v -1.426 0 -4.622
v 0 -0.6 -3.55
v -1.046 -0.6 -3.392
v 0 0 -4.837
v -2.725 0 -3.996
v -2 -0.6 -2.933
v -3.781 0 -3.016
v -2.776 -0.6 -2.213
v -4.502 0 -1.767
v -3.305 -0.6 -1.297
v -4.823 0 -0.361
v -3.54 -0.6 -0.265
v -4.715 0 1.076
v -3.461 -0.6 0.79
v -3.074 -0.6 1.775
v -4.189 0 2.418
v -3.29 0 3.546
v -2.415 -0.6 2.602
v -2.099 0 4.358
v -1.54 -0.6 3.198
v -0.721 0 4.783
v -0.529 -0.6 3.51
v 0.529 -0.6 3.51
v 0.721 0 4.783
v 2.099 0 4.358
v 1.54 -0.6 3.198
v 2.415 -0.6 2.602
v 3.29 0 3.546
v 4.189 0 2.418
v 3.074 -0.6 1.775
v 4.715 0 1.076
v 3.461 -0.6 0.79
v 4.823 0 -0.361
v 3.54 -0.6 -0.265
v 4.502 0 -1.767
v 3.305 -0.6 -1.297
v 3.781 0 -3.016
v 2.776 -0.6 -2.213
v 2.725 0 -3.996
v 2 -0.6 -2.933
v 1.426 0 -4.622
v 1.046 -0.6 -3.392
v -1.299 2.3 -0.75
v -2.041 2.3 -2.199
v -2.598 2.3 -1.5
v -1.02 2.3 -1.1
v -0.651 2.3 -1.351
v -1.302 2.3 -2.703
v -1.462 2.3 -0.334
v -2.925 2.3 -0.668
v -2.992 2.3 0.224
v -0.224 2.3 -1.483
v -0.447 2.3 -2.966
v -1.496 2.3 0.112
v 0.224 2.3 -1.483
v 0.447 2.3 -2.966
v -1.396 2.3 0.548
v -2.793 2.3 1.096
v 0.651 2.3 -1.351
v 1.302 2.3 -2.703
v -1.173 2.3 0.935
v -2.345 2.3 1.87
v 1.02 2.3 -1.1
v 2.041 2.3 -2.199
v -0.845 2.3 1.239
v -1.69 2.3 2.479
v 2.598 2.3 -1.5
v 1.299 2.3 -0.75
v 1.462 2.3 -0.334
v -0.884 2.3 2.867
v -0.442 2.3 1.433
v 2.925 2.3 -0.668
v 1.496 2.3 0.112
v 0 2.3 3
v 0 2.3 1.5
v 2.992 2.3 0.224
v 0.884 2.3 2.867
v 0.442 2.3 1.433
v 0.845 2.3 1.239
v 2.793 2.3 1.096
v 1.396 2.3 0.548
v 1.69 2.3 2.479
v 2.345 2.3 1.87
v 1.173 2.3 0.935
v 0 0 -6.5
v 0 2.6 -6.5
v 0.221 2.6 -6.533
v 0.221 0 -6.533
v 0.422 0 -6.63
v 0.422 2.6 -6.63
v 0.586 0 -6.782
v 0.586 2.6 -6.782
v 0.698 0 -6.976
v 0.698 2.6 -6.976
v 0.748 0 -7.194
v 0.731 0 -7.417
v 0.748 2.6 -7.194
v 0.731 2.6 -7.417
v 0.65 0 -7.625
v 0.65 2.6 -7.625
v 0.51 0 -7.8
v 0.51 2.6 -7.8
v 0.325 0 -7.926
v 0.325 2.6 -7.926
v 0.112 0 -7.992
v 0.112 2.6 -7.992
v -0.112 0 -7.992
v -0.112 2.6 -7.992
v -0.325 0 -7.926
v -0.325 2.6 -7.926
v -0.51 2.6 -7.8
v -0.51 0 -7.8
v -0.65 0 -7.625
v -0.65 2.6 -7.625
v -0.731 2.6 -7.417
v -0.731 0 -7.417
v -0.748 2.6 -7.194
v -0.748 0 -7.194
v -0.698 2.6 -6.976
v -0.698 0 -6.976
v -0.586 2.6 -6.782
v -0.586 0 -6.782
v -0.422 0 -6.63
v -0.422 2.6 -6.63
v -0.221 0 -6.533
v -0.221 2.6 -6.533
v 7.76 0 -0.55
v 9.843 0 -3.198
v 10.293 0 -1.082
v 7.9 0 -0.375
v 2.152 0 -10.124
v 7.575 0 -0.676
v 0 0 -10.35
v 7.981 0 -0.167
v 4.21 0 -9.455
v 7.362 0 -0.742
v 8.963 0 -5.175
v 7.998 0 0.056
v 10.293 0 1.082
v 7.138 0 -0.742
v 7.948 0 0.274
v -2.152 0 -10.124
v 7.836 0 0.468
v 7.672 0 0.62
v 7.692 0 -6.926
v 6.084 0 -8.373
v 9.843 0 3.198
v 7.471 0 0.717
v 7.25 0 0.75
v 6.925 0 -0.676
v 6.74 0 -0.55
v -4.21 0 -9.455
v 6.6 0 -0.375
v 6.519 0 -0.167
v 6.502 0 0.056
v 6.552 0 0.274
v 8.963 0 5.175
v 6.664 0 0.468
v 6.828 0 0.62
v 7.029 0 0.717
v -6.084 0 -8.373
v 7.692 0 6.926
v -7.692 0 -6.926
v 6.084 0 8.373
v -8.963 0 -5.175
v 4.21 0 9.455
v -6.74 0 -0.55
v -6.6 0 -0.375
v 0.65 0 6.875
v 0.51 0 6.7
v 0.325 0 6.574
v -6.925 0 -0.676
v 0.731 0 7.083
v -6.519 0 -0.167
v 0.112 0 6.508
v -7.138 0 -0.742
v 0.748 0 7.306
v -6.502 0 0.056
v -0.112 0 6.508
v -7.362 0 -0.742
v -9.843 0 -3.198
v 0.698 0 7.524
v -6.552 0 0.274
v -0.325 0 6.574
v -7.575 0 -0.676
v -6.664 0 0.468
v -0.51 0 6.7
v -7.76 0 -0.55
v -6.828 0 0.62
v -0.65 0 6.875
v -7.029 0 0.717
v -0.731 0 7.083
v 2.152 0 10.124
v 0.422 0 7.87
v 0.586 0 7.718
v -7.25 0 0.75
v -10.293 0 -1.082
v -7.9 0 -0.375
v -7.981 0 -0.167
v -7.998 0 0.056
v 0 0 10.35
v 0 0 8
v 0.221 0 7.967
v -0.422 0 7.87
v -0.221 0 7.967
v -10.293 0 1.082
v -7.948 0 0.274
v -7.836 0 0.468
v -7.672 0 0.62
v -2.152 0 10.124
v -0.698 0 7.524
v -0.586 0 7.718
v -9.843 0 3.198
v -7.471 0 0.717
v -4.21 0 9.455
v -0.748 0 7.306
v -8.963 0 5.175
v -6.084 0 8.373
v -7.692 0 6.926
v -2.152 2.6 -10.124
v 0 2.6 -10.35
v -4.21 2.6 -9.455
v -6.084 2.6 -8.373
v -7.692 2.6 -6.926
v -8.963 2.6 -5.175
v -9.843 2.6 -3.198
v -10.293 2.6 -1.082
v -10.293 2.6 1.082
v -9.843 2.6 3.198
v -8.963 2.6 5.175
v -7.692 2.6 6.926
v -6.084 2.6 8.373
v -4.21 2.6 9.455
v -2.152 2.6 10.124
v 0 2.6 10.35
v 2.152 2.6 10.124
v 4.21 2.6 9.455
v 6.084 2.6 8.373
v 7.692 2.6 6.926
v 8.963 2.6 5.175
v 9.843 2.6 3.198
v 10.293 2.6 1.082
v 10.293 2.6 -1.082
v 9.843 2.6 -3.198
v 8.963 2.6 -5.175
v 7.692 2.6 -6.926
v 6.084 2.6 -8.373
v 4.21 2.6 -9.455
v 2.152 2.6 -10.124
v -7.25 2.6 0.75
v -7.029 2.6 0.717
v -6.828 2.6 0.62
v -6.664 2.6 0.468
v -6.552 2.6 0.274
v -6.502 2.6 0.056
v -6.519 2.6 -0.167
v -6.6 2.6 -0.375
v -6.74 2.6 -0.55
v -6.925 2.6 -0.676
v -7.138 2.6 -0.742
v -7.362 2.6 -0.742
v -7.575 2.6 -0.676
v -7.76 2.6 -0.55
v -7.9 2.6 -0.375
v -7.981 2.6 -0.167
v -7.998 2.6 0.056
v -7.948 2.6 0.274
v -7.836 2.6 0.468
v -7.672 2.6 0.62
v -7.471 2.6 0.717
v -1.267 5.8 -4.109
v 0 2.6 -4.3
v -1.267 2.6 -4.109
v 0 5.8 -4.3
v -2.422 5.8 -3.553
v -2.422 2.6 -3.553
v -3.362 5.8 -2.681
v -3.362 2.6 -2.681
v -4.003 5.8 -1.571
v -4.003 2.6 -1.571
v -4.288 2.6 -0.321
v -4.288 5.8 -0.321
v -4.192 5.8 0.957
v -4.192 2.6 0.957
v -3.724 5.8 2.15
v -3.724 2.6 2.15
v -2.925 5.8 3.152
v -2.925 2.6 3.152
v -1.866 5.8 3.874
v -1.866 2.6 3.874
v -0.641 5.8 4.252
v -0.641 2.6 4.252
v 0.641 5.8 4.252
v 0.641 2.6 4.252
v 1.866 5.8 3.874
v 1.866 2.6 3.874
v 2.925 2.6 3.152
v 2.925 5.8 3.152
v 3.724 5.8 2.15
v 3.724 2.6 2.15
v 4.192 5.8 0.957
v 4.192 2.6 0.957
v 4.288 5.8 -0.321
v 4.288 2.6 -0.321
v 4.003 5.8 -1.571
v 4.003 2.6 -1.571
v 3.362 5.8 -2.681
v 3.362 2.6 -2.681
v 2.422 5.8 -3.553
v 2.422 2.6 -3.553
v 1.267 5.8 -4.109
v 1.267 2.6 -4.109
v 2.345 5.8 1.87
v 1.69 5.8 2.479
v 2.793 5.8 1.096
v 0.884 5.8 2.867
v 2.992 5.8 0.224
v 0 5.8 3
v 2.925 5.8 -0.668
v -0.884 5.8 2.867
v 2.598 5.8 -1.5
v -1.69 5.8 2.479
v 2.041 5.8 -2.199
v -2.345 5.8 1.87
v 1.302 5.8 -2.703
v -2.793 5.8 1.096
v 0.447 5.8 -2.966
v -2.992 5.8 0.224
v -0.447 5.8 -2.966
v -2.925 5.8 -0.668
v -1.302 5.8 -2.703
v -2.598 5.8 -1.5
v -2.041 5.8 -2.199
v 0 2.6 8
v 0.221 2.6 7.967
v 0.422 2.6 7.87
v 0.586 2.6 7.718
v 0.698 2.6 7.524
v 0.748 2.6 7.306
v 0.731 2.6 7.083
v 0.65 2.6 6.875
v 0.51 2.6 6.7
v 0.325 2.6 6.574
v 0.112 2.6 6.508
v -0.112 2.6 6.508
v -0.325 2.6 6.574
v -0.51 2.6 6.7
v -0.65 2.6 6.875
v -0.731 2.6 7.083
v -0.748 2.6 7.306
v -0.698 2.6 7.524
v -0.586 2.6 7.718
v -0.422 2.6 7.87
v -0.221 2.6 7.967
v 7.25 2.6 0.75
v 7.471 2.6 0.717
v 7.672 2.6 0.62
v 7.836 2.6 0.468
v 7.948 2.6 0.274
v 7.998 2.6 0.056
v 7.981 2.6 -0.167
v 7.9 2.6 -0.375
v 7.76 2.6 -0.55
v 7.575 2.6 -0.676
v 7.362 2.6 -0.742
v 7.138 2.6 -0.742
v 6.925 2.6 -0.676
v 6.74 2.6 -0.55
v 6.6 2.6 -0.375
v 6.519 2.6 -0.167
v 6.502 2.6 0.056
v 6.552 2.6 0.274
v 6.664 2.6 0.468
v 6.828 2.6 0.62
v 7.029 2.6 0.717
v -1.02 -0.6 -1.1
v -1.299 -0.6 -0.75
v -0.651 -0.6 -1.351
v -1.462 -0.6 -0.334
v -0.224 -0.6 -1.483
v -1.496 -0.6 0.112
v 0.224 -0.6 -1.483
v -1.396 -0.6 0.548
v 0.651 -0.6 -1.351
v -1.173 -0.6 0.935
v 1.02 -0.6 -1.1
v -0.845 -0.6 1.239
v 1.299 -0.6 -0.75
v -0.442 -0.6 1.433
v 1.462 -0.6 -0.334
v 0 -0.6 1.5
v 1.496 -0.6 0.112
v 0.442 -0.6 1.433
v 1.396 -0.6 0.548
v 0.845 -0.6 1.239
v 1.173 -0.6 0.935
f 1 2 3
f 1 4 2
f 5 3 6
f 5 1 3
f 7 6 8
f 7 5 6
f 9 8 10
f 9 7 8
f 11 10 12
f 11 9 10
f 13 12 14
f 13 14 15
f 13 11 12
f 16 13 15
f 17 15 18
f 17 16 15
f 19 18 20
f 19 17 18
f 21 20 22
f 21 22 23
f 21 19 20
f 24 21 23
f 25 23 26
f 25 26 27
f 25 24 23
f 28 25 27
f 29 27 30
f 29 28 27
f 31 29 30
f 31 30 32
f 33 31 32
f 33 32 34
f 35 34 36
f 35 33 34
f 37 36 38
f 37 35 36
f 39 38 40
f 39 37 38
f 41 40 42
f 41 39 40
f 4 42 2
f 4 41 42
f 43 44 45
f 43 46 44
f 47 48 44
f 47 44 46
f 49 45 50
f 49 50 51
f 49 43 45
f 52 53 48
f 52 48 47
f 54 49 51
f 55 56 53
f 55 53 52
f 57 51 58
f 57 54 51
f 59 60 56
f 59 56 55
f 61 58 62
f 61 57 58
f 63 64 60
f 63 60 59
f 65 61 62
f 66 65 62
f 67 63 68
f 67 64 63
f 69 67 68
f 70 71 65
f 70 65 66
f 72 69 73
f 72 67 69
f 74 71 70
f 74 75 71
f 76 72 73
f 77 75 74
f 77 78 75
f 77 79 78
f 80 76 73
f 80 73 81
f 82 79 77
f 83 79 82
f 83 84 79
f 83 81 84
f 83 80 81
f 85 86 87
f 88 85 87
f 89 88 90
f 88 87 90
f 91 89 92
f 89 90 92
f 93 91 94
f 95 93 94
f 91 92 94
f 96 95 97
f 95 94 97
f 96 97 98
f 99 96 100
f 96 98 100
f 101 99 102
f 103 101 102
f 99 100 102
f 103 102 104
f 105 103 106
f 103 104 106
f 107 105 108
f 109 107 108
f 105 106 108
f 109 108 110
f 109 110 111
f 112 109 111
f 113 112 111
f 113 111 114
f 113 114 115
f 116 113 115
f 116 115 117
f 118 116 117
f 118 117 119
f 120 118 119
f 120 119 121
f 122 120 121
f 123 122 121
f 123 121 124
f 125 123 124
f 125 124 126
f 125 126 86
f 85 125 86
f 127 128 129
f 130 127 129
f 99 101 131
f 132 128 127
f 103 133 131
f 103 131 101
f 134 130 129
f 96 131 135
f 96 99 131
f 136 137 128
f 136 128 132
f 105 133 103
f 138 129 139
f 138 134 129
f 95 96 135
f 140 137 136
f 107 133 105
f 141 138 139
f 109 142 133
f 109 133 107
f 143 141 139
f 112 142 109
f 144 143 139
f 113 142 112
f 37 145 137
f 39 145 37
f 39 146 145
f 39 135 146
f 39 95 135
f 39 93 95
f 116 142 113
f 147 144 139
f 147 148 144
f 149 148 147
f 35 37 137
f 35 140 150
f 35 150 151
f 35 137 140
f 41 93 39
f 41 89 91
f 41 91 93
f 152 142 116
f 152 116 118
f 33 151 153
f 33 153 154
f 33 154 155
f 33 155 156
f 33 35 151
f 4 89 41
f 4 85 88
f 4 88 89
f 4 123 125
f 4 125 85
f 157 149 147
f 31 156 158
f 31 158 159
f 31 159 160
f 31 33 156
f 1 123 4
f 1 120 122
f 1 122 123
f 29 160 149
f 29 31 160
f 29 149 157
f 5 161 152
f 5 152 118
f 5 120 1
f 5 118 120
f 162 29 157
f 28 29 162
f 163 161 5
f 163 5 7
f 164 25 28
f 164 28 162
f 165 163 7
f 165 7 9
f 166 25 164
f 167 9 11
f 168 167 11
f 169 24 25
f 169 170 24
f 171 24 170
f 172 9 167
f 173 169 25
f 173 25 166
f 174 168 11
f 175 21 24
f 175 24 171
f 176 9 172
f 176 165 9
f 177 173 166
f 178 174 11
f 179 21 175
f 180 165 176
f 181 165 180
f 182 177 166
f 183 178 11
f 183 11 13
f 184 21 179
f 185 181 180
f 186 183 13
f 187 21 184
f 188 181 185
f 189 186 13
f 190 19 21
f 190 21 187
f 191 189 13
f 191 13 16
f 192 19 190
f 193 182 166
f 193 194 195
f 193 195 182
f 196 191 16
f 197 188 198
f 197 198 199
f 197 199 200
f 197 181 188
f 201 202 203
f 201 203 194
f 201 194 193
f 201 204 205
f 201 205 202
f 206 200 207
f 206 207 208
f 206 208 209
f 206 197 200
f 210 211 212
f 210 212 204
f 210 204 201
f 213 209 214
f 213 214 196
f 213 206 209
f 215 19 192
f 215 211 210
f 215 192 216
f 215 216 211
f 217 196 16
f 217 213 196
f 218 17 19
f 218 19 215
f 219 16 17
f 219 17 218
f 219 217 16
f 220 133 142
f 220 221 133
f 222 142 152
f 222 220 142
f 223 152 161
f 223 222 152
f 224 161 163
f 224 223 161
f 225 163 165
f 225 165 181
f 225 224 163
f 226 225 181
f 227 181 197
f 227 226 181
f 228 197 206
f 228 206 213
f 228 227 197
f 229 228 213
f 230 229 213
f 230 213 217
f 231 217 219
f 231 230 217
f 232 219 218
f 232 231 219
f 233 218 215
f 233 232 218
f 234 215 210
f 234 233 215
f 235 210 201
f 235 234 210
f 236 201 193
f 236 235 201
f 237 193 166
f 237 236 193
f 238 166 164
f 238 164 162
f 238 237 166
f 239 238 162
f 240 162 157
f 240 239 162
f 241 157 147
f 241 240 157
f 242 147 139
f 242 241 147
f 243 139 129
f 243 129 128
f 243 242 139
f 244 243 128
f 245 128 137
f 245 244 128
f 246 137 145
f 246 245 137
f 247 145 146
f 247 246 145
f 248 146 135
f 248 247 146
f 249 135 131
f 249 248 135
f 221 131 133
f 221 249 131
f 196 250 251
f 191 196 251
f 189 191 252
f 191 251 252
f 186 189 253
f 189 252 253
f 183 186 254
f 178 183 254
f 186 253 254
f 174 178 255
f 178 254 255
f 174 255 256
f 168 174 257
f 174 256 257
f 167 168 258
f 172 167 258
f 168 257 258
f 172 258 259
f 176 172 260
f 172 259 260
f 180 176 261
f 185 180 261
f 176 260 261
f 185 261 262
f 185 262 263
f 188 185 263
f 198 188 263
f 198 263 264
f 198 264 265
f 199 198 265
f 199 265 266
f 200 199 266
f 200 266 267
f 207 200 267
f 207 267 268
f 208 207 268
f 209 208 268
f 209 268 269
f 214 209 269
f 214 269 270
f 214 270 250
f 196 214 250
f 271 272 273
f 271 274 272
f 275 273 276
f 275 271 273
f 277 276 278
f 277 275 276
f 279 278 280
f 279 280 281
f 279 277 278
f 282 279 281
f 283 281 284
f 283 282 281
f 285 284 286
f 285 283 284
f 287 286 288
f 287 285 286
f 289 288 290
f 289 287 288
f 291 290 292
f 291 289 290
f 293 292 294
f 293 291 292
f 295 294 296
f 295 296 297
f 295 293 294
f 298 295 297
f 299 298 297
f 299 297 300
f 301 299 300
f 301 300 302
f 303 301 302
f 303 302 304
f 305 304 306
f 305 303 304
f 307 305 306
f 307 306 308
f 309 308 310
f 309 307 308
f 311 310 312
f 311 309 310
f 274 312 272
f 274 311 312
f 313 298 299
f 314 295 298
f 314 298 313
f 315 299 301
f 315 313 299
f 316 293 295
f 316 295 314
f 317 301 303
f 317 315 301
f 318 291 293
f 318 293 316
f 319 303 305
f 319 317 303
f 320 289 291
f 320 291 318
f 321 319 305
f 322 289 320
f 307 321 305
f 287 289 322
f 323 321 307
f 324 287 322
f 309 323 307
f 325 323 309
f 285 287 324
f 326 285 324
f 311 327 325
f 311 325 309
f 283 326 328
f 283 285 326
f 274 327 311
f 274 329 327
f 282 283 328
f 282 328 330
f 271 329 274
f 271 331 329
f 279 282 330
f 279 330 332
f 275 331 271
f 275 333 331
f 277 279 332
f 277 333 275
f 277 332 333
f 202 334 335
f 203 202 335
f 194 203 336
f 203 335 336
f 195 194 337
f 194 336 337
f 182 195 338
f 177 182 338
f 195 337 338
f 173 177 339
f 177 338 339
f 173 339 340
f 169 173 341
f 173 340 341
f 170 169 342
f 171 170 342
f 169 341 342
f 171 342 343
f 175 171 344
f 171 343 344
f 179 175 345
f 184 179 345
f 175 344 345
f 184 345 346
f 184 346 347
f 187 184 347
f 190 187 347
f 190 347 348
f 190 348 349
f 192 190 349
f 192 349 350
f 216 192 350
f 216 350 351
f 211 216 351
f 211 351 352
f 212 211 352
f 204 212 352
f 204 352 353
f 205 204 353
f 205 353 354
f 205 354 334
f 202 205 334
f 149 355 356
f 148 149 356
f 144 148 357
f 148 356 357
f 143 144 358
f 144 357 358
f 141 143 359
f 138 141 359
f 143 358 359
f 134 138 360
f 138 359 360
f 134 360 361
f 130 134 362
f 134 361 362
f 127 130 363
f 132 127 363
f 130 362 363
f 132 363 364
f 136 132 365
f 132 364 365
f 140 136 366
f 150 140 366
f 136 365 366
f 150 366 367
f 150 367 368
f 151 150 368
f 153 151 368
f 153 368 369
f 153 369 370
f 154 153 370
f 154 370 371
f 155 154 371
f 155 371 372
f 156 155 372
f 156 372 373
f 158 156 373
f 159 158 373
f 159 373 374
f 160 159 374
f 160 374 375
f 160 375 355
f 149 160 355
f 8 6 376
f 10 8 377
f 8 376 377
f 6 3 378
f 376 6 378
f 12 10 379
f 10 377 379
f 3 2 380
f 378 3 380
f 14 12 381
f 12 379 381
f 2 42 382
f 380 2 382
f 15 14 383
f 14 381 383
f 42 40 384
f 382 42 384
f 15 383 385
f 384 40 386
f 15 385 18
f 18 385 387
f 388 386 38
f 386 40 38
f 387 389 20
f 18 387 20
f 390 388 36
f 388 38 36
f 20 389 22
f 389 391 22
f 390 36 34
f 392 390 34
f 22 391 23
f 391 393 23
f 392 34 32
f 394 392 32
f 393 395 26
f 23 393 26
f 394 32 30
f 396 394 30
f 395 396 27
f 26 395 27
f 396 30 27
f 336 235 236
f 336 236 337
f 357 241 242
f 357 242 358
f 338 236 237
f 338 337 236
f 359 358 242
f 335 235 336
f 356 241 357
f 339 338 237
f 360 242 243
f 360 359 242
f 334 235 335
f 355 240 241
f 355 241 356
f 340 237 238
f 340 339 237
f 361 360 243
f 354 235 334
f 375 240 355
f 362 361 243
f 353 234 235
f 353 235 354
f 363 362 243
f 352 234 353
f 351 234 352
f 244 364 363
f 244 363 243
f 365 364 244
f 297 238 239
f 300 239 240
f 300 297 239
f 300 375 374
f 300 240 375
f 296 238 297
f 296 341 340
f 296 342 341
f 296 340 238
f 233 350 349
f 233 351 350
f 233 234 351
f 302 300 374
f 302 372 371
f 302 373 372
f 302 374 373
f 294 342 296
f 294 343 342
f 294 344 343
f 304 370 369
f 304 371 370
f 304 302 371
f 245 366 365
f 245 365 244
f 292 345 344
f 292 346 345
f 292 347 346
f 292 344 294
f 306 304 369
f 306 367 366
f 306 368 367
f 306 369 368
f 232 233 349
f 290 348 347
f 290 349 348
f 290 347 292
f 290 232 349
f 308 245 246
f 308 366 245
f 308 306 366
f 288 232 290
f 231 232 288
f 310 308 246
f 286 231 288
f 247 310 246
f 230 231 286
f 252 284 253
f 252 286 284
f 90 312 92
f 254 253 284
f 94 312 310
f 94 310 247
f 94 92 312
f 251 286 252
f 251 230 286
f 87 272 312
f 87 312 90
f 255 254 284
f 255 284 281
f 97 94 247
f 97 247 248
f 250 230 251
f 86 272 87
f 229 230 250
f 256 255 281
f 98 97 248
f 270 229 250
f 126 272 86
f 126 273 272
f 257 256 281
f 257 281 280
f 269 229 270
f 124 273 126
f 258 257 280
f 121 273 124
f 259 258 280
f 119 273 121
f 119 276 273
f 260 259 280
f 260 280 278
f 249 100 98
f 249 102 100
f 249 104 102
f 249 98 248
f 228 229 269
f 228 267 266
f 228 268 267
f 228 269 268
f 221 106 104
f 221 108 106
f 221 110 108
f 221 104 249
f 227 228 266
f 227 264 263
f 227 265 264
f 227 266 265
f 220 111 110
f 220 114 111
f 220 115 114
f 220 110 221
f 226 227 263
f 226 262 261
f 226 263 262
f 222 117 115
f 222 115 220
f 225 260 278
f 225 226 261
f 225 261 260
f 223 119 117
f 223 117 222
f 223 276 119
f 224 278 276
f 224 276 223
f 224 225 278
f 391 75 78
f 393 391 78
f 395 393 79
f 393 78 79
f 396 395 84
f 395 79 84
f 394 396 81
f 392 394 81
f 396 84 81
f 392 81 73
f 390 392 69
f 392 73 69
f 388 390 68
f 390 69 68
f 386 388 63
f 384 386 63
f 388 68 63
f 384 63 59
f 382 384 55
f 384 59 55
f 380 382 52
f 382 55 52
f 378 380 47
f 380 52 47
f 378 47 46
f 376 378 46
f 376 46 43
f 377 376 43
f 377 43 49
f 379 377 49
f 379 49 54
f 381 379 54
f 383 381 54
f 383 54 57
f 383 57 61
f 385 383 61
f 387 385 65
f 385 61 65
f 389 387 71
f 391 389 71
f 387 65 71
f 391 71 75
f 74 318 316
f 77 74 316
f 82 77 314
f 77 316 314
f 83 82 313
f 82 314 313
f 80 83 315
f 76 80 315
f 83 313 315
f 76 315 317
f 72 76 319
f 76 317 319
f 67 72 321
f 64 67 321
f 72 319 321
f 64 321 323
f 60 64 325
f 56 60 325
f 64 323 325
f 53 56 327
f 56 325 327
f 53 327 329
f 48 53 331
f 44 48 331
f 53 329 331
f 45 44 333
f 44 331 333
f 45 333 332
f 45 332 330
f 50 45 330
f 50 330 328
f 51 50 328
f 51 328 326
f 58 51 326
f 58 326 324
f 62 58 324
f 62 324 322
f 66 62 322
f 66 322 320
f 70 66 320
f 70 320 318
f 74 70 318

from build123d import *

# Parameters (mm, degrees)
SKETCH_2_R          = 3
SKETCH_2_R_2        = 0.75
CUT_EXTRUDE_1_DEPTH = 10
EXTRUDE_START       = -3.5
SKETCH_3_R          = 3
SKETCH_3_R_2        = 1.5
EXTRUDE_1_DEPTH     = 2.9


with BuildPart() as part:
    # 草图1 → 旋转1 (revolve)
    with BuildSketch(Plane.XY, mode=Mode.PRIVATE) as revolve_1_sk:
        Polygon((0, -0.6), (-3.55, -0.6), (-4.836704152, 0), (-10.35, 0), (-10.35, 2.6), (-4.3, 2.6), (-4.3, 5.8), (0, 5.8), align=None)
    revolve(revolve_1_sk.sketch.rotate(Axis((0, 0, 0), (0, 1, 0)), 270), axis=Axis((0, 0, 0), (0, 1, 0)))

    # 草图2 → 切除-拉伸1 (cut)
    with BuildSketch(Plane(origin=(0, 5.8, 0), x_dir=(1, 0, 0), z_dir=(0, 1, 0))):
        with Locations(Location((0, 0, 0), (0, 0, 270))):
            Circle(SKETCH_2_R)
        with Locations(Location((0, 7.25, 0), (0, 0, 270))):
            Circle(SKETCH_2_R_2)
        with Locations(Location((7.25, 0, 0), (0, 0, 270))):
            Circle(SKETCH_2_R_2)
        with Locations(Location((0, -7.25, 0), (0, 0, 270))):
            Circle(SKETCH_2_R_2)
        with Locations(Location((-7.25, 0, 0), (0, 0, 270))):
            Circle(SKETCH_2_R_2)
    extrude(amount=-CUT_EXTRUDE_1_DEPTH, mode=Mode.SUBTRACT)

    # 草图3 → 凸台-拉伸1 (add)
    with BuildSketch(Plane(origin=(0, 5.8, 0), x_dir=(1, 0, 0), z_dir=(0, 1, 0)).offset(EXTRUDE_START)):
        with Locations(Location((0, 0, 0), (0, 0, 270))):
            Circle(SKETCH_3_R)
        with Locations(Location((0, 0, 0), (0, 0, 270))):
            Circle(SKETCH_3_R_2, mode=Mode.SUBTRACT)
    extrude(amount=-EXTRUDE_1_DEPTH)


solid = part.part
